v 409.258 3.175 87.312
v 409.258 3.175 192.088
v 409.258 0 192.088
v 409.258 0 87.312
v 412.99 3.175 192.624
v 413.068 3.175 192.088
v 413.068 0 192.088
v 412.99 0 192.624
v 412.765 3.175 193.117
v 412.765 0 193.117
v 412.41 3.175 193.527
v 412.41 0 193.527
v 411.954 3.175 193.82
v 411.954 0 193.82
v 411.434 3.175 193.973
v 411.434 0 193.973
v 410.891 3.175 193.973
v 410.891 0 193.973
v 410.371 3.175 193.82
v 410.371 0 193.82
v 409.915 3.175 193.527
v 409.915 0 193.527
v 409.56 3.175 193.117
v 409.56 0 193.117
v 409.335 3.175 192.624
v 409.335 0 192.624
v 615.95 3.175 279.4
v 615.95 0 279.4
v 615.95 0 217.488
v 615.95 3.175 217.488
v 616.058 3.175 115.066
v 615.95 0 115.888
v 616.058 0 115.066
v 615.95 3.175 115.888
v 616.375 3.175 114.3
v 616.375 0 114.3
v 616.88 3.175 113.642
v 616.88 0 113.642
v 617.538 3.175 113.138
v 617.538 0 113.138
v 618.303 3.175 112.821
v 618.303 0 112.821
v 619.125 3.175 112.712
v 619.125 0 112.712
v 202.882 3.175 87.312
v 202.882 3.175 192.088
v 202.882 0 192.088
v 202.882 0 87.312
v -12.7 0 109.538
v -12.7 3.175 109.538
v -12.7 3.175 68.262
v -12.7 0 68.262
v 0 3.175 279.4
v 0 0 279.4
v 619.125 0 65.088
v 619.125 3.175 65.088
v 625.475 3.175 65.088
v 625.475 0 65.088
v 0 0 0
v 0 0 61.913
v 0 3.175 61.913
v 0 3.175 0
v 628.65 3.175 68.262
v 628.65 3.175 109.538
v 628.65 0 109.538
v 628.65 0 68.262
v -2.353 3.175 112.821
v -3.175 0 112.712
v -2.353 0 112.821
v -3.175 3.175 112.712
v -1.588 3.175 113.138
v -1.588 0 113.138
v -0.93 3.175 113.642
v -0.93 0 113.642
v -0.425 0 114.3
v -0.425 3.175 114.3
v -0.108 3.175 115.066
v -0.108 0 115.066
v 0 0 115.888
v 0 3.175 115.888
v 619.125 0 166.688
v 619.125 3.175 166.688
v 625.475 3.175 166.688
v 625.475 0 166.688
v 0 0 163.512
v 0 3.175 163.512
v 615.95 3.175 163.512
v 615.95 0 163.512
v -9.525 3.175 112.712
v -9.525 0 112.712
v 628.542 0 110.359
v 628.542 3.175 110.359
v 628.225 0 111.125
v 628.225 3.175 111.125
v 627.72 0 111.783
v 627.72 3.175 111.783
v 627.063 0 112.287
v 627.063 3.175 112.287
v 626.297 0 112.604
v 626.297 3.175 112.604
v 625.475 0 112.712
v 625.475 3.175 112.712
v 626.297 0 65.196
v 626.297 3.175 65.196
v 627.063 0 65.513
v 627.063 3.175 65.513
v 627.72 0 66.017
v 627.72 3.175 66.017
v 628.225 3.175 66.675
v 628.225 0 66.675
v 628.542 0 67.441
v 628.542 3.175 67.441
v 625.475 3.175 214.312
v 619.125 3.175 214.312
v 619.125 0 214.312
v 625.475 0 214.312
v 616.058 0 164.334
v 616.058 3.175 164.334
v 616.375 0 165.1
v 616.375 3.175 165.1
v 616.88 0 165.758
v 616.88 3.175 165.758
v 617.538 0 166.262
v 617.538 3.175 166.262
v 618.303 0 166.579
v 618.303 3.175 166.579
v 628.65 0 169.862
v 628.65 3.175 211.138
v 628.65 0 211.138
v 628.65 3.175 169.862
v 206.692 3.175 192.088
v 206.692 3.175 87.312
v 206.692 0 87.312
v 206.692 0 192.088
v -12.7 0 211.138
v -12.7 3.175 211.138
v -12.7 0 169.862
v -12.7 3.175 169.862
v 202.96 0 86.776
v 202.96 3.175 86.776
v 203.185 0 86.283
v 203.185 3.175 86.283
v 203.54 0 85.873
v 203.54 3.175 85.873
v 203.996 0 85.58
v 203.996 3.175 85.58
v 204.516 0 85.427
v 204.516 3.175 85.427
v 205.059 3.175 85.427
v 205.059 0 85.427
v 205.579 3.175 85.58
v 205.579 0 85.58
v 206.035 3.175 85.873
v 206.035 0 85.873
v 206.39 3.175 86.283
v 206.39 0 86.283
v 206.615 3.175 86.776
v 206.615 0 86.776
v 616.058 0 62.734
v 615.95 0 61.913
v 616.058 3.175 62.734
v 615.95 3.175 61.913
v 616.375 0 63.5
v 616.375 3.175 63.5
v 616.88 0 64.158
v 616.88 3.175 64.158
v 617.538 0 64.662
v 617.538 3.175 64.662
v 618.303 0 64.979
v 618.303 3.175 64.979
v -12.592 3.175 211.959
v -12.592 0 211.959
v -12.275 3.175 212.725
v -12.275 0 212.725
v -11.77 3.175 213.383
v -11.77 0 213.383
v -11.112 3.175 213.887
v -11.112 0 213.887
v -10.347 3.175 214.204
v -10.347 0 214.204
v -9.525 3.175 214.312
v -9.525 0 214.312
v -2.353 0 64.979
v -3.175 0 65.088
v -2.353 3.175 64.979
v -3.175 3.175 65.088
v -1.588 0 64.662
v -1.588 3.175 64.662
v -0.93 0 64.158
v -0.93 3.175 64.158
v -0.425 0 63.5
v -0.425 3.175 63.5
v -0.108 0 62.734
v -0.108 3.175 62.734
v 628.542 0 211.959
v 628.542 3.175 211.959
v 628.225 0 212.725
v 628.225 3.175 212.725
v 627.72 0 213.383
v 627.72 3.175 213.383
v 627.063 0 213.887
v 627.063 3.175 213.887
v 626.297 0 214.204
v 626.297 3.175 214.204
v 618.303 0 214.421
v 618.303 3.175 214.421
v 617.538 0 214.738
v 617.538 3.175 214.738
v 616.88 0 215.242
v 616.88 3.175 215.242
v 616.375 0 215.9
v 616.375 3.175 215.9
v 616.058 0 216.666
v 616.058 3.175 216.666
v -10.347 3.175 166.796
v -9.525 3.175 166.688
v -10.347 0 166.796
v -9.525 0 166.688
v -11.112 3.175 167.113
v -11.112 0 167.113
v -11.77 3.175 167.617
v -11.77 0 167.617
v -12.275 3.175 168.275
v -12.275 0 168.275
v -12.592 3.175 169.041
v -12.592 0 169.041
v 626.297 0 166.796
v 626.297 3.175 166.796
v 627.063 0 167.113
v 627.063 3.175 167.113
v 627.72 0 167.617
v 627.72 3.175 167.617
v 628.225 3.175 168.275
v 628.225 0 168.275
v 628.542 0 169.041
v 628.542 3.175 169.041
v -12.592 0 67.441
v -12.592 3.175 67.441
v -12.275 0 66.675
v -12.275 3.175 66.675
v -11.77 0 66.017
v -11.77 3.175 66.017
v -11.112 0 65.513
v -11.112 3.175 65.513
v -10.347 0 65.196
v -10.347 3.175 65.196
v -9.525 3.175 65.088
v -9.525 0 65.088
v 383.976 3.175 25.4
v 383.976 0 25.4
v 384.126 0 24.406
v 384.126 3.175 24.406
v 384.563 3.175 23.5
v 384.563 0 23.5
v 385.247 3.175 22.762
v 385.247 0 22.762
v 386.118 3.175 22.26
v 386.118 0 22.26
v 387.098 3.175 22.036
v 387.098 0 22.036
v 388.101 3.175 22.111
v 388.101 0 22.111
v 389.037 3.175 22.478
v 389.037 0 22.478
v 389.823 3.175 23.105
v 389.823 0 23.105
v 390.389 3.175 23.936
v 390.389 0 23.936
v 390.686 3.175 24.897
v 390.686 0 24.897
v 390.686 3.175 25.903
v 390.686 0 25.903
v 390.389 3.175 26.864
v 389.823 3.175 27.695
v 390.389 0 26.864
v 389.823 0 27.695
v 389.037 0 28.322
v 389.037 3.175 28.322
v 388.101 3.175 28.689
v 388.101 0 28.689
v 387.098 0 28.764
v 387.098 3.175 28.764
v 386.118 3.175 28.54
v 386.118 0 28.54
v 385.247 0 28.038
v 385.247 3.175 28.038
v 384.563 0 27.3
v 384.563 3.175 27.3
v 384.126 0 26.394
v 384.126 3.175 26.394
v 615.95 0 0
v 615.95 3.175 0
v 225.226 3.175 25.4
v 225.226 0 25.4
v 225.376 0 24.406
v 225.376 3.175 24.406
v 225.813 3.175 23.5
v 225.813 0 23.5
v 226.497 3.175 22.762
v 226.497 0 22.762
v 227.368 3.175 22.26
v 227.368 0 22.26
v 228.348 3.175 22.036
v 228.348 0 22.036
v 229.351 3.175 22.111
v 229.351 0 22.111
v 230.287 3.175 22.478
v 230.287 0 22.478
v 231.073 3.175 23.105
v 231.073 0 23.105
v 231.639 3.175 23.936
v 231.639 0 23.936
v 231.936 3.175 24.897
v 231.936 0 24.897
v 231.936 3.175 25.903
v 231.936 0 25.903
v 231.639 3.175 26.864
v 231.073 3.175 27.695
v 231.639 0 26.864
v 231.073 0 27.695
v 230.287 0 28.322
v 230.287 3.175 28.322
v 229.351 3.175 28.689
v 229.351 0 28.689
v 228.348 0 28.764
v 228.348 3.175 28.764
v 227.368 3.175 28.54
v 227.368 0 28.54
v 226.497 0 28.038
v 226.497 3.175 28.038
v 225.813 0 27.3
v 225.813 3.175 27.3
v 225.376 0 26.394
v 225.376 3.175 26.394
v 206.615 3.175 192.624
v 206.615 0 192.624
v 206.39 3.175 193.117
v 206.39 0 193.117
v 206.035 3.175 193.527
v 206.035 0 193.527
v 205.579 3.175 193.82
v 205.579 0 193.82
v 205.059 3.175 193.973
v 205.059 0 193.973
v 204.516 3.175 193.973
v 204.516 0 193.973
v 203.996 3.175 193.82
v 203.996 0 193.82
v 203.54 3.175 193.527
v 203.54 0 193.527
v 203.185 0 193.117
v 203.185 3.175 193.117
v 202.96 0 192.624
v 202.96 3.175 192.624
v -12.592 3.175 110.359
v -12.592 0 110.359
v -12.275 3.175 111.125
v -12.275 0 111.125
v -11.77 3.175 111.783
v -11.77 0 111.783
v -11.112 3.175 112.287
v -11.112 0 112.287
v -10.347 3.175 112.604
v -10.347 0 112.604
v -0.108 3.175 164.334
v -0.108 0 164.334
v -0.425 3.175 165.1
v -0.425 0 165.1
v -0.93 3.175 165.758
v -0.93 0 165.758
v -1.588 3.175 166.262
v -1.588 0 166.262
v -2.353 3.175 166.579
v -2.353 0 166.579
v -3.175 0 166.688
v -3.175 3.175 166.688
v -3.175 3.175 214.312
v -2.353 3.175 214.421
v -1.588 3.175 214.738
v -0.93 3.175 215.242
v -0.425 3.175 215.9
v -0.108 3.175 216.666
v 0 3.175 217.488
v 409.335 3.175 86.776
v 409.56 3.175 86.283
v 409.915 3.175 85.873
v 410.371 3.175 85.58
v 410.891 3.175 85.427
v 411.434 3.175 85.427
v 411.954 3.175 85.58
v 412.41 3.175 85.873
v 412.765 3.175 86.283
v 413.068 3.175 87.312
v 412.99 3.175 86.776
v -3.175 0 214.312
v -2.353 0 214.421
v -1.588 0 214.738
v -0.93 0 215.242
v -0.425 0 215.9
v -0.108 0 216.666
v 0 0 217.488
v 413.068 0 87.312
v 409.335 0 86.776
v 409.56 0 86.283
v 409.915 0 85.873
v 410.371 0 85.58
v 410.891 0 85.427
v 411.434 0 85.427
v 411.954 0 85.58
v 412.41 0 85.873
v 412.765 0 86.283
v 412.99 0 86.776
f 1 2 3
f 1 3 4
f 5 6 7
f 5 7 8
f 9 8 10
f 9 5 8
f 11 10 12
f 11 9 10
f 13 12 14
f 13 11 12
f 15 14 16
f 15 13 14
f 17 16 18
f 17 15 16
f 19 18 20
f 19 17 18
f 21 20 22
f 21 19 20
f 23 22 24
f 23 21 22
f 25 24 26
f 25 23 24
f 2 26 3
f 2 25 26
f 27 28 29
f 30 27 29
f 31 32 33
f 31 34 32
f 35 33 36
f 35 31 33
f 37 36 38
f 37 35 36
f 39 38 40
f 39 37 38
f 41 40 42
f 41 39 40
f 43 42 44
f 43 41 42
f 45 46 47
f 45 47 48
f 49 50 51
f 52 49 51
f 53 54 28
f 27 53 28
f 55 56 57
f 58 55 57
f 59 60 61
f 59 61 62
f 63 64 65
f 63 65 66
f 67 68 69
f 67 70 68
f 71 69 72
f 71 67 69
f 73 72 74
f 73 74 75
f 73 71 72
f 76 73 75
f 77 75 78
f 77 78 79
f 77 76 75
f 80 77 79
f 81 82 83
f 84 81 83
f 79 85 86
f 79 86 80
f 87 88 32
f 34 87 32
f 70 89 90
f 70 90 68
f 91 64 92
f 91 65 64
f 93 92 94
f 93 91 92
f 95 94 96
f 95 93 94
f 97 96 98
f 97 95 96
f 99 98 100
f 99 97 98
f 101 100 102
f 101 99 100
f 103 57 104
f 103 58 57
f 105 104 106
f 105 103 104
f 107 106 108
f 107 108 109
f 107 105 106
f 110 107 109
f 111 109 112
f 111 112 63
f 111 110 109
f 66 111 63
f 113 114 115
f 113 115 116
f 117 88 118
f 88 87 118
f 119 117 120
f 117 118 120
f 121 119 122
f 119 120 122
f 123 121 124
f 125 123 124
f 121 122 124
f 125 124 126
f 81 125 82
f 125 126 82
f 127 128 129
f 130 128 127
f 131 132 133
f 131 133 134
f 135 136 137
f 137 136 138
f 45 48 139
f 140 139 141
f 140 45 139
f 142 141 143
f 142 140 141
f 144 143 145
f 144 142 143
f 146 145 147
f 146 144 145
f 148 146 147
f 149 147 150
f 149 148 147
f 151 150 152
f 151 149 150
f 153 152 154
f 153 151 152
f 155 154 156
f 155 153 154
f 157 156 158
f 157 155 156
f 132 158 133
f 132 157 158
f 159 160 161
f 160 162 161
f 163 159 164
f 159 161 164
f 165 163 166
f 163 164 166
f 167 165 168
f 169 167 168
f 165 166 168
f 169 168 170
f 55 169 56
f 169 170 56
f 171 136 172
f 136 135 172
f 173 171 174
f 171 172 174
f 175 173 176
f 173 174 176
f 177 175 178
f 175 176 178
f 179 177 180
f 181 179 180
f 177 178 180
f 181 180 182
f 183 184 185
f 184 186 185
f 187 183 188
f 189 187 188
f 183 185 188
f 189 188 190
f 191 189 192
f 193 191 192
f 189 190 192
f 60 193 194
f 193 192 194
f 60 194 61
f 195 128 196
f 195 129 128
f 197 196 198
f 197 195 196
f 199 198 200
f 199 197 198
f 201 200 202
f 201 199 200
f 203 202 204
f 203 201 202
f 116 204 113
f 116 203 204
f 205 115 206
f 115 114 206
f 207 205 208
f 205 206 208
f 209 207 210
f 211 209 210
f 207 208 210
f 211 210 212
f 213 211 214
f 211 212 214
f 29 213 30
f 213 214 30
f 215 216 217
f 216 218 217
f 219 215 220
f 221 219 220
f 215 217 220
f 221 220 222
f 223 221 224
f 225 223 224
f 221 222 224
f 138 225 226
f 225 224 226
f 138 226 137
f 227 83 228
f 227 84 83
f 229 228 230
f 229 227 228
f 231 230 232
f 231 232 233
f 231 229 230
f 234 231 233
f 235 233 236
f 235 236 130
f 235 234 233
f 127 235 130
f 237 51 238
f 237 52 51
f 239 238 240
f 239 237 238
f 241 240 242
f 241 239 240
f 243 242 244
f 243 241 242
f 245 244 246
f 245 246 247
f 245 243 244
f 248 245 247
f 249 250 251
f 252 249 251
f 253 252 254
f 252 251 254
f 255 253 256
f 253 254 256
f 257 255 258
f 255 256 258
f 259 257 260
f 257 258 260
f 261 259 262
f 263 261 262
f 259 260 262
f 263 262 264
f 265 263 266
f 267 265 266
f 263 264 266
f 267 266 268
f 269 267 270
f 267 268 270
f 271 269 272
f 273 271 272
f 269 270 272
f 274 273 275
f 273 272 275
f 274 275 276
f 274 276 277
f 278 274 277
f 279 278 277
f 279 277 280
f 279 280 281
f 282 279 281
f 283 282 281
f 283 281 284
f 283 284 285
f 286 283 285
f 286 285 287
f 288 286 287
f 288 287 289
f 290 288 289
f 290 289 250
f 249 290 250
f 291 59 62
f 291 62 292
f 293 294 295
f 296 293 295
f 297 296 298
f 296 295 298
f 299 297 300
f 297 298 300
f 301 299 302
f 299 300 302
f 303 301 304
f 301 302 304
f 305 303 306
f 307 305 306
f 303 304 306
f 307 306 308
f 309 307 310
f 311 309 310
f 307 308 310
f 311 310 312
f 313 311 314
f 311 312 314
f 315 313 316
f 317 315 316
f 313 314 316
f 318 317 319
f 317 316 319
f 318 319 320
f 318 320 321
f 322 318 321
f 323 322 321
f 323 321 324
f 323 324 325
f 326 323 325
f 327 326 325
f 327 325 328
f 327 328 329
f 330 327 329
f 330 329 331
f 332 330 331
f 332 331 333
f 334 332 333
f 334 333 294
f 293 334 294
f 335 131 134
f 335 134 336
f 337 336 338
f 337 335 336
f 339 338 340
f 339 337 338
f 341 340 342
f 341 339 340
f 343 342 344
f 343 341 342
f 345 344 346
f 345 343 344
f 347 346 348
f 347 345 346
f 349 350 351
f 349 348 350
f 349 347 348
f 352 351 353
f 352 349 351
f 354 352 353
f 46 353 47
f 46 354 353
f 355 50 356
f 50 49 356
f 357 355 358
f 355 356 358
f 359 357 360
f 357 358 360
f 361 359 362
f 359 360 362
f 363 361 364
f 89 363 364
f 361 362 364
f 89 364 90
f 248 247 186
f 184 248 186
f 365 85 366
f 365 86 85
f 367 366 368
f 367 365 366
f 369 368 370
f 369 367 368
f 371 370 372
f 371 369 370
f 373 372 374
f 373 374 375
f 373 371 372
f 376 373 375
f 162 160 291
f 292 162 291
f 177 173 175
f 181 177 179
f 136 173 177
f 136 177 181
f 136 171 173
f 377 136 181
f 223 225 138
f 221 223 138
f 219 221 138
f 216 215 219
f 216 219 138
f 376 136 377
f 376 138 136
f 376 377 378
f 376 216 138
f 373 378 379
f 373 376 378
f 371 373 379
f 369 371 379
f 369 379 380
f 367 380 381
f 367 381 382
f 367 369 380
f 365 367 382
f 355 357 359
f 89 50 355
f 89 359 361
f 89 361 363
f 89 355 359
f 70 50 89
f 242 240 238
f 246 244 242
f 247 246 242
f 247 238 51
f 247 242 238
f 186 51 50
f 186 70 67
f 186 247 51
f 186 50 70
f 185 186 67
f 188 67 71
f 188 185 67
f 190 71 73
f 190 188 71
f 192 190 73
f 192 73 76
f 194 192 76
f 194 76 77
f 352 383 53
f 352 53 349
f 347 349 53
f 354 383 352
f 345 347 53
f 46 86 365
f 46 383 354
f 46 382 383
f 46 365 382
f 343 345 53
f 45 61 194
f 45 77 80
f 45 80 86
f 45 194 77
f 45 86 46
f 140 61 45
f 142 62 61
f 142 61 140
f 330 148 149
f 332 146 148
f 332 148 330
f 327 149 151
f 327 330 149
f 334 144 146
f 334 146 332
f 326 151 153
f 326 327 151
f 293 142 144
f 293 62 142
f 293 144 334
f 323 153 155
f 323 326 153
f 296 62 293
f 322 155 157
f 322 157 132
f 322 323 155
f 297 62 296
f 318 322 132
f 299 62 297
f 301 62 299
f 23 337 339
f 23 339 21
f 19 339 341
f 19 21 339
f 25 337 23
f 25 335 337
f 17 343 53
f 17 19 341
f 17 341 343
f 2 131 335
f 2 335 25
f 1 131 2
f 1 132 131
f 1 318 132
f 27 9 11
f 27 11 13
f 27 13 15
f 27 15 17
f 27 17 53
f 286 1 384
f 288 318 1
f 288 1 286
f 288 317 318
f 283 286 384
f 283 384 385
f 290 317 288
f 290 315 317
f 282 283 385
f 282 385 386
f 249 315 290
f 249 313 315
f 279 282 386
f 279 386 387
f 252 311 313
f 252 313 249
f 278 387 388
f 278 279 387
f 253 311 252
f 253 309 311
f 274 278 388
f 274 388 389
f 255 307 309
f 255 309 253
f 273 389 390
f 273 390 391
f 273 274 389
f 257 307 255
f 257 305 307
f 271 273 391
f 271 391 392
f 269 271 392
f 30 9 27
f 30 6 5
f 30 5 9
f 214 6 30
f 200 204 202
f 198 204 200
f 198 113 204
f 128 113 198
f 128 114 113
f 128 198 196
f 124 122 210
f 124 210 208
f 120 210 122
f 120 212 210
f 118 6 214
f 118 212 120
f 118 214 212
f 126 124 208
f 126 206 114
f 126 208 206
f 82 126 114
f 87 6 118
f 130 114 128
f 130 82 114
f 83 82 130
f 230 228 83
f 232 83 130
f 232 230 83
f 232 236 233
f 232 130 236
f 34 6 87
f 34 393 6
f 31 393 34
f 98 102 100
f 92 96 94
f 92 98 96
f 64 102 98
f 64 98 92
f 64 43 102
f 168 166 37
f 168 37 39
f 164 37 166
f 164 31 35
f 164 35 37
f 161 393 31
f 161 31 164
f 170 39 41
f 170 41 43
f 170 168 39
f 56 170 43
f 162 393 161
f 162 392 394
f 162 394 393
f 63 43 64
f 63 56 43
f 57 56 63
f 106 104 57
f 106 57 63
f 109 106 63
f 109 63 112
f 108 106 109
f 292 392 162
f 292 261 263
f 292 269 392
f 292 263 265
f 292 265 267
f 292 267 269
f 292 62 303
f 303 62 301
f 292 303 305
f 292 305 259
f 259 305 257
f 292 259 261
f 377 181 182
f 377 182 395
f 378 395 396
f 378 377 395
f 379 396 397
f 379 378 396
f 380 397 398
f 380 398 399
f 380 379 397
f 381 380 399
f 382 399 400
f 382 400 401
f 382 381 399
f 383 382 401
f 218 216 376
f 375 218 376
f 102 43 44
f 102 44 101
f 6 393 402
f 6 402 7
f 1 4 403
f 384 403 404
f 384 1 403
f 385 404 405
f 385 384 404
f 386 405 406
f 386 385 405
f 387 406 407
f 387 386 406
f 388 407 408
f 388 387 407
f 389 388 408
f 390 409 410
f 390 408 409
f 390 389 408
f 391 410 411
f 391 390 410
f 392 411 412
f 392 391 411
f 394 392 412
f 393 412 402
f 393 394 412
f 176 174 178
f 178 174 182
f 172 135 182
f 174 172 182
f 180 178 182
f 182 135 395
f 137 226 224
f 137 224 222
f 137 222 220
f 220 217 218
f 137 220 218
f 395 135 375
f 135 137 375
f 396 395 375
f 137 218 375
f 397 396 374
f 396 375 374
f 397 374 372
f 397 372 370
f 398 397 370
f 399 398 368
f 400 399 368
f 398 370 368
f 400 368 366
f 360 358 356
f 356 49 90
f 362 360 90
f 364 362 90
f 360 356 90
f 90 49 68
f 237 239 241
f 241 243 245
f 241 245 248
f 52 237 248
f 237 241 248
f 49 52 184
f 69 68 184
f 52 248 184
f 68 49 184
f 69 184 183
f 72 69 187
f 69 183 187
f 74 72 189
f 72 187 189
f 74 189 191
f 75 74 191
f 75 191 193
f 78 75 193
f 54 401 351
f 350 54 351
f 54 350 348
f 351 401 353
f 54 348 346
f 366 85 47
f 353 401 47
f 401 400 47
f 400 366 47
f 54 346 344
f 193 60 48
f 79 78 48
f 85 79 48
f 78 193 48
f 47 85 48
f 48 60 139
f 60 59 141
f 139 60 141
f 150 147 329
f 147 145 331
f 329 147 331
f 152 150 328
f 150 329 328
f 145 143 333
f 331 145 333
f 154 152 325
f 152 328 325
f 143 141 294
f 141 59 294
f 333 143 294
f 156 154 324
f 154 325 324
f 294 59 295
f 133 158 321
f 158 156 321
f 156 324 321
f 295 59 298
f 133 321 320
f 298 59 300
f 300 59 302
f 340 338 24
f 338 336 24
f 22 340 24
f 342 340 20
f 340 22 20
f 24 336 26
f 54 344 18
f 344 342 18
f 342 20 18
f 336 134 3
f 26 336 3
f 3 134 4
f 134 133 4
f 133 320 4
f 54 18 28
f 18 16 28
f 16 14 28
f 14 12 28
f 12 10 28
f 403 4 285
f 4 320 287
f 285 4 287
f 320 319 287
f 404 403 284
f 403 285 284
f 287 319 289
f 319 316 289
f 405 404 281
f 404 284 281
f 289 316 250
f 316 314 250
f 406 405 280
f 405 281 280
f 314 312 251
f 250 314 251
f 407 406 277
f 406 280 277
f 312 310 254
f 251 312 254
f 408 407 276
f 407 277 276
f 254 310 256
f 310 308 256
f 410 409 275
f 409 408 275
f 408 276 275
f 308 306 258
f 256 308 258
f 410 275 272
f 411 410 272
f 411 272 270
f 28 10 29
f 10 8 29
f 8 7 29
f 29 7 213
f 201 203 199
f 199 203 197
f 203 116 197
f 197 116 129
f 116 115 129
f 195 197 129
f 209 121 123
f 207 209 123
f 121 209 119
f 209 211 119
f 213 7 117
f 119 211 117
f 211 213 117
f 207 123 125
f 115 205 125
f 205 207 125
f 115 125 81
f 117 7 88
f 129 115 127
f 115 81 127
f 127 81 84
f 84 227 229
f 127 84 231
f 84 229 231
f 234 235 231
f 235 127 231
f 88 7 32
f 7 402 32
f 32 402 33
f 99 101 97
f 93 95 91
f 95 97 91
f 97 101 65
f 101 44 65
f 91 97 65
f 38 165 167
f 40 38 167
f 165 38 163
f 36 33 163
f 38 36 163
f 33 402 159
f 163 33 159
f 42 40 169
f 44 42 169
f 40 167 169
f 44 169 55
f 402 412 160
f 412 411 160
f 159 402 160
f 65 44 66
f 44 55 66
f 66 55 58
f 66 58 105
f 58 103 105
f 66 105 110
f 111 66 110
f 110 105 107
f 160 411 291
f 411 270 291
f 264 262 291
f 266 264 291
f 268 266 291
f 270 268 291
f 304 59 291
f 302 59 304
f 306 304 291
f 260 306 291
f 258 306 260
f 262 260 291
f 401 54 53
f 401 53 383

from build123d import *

# Parameters (mm, degrees)
SKETCH1_W                        = 615.95
SKETCH1_H                        = 279.4
BOSS_EXTRUDE1_DEPTH              = 3.175
SKETCH2_W                        = 641.35
SKETCH2_H                        = 47.625
BOSS_EXTRUDE2_DEPTH              = 3.175
FILLET1_R                        = 3.175
CUT_EXTRUDE1_DEPTH               = 4.175
F_17_64_0_26563_DIAMETER_HOLE1_D = 6.747002


with BuildPart() as part:
    # Sketch1 → Boss-Extrude1 (new body)
    with BuildSketch(Plane(origin=(0, 0, 0), x_dir=(1, 0, 0), z_dir=(0, 1, 0))):
        with Locations((307.975, -139.7)):
            Rectangle(SKETCH1_W, SKETCH1_H)
    extrude(amount=BOSS_EXTRUDE1_DEPTH)

    # Sketch2 → Boss-Extrude2 (add, through all)
    with BuildSketch(Plane(origin=(0, 3.175, 0), x_dir=(1, 0, 0), z_dir=(0, 1, 0))):
        with Locations((307.975, -88.9)):
            Rectangle(SKETCH2_W, SKETCH2_H)
        with Locations((307.975, -190.5)):
            Rectangle(SKETCH2_W, SKETCH2_H)
    extrude(amount=-BOSS_EXTRUDE2_DEPTH)

    # Fillet1
    fillet1_edges = [part.edges().sort_by_distance(p)[0] for p in [
        (628.65, 1.5875, 112.7125),
        (-12.7, 1.5875, 65.0875),
        (628.65, 1.5875, 65.0875),
        (0, 1.5875, 112.7125),
        (615.95, 1.5875, 112.7125),
        (-12.7, 1.5875, 112.7125),
        (0, 1.5875, 65.0875),
        (615.95, 1.5875, 65.0875),
        (628.65, 1.5875, 214.3125),
        (-12.7, 1.5875, 166.6875),
        (628.65, 1.5875, 166.6875),
        (0, 1.5875, 214.3125),
        (615.95, 1.5875, 214.3125),
        (-12.7, 1.5875, 214.3125),
        (0, 1.5875, 166.6875),
        (615.95, 1.5875, 166.6875),
    ]]
    fillet(fillet1_edges, radius=FILLET1_R)

    # Sketch3 → Cut-Extrude1 (cut, through all)
    with BuildSketch(Plane(origin=(0, 3.175, 0), x_dir=(1, 0, 0), z_dir=(0, 1, 0))):
        with BuildLine():
            Line((202.8825, -192.0875), (202.8825, -87.3125))
            ThreePointArc((202.8825, -87.3125), (204.7875, -85.4075), (206.6925, -87.3125))
            Line((206.6925, -87.3125), (206.6925, -192.0875))
            ThreePointArc((206.6925, -192.0875), (204.7875, -193.9925), (202.8825, -192.0875))
        make_face()
        with BuildLine():
            Line((409.2575, -192.0875), (409.2575, -87.3125))
            ThreePointArc((409.2575, -87.3125), (411.1625, -85.4075), (413.0675, -87.3125))
            Line((413.0675, -87.3125), (413.0675, -192.0875))
            ThreePointArc((413.0675, -192.0875), (411.1625, -193.9925), (409.2575, -192.0875))
        make_face()
    extrude(amount=-CUT_EXTRUDE1_DEPTH, mode=Mode.SUBTRACT)

    # 17/64 (0.26563) Diameter Hole1 (through all)
    with Locations(Plane(origin=(0, 3.175, 0), x_dir=(1, 0, 0), z_dir=(0, 1, 0))):
        with Locations((387.35, -25.4), (228.6, -25.4)):
            Hole(F_17_64_0_26563_DIAMETER_HOLE1_D / 2)


solid = part.part
